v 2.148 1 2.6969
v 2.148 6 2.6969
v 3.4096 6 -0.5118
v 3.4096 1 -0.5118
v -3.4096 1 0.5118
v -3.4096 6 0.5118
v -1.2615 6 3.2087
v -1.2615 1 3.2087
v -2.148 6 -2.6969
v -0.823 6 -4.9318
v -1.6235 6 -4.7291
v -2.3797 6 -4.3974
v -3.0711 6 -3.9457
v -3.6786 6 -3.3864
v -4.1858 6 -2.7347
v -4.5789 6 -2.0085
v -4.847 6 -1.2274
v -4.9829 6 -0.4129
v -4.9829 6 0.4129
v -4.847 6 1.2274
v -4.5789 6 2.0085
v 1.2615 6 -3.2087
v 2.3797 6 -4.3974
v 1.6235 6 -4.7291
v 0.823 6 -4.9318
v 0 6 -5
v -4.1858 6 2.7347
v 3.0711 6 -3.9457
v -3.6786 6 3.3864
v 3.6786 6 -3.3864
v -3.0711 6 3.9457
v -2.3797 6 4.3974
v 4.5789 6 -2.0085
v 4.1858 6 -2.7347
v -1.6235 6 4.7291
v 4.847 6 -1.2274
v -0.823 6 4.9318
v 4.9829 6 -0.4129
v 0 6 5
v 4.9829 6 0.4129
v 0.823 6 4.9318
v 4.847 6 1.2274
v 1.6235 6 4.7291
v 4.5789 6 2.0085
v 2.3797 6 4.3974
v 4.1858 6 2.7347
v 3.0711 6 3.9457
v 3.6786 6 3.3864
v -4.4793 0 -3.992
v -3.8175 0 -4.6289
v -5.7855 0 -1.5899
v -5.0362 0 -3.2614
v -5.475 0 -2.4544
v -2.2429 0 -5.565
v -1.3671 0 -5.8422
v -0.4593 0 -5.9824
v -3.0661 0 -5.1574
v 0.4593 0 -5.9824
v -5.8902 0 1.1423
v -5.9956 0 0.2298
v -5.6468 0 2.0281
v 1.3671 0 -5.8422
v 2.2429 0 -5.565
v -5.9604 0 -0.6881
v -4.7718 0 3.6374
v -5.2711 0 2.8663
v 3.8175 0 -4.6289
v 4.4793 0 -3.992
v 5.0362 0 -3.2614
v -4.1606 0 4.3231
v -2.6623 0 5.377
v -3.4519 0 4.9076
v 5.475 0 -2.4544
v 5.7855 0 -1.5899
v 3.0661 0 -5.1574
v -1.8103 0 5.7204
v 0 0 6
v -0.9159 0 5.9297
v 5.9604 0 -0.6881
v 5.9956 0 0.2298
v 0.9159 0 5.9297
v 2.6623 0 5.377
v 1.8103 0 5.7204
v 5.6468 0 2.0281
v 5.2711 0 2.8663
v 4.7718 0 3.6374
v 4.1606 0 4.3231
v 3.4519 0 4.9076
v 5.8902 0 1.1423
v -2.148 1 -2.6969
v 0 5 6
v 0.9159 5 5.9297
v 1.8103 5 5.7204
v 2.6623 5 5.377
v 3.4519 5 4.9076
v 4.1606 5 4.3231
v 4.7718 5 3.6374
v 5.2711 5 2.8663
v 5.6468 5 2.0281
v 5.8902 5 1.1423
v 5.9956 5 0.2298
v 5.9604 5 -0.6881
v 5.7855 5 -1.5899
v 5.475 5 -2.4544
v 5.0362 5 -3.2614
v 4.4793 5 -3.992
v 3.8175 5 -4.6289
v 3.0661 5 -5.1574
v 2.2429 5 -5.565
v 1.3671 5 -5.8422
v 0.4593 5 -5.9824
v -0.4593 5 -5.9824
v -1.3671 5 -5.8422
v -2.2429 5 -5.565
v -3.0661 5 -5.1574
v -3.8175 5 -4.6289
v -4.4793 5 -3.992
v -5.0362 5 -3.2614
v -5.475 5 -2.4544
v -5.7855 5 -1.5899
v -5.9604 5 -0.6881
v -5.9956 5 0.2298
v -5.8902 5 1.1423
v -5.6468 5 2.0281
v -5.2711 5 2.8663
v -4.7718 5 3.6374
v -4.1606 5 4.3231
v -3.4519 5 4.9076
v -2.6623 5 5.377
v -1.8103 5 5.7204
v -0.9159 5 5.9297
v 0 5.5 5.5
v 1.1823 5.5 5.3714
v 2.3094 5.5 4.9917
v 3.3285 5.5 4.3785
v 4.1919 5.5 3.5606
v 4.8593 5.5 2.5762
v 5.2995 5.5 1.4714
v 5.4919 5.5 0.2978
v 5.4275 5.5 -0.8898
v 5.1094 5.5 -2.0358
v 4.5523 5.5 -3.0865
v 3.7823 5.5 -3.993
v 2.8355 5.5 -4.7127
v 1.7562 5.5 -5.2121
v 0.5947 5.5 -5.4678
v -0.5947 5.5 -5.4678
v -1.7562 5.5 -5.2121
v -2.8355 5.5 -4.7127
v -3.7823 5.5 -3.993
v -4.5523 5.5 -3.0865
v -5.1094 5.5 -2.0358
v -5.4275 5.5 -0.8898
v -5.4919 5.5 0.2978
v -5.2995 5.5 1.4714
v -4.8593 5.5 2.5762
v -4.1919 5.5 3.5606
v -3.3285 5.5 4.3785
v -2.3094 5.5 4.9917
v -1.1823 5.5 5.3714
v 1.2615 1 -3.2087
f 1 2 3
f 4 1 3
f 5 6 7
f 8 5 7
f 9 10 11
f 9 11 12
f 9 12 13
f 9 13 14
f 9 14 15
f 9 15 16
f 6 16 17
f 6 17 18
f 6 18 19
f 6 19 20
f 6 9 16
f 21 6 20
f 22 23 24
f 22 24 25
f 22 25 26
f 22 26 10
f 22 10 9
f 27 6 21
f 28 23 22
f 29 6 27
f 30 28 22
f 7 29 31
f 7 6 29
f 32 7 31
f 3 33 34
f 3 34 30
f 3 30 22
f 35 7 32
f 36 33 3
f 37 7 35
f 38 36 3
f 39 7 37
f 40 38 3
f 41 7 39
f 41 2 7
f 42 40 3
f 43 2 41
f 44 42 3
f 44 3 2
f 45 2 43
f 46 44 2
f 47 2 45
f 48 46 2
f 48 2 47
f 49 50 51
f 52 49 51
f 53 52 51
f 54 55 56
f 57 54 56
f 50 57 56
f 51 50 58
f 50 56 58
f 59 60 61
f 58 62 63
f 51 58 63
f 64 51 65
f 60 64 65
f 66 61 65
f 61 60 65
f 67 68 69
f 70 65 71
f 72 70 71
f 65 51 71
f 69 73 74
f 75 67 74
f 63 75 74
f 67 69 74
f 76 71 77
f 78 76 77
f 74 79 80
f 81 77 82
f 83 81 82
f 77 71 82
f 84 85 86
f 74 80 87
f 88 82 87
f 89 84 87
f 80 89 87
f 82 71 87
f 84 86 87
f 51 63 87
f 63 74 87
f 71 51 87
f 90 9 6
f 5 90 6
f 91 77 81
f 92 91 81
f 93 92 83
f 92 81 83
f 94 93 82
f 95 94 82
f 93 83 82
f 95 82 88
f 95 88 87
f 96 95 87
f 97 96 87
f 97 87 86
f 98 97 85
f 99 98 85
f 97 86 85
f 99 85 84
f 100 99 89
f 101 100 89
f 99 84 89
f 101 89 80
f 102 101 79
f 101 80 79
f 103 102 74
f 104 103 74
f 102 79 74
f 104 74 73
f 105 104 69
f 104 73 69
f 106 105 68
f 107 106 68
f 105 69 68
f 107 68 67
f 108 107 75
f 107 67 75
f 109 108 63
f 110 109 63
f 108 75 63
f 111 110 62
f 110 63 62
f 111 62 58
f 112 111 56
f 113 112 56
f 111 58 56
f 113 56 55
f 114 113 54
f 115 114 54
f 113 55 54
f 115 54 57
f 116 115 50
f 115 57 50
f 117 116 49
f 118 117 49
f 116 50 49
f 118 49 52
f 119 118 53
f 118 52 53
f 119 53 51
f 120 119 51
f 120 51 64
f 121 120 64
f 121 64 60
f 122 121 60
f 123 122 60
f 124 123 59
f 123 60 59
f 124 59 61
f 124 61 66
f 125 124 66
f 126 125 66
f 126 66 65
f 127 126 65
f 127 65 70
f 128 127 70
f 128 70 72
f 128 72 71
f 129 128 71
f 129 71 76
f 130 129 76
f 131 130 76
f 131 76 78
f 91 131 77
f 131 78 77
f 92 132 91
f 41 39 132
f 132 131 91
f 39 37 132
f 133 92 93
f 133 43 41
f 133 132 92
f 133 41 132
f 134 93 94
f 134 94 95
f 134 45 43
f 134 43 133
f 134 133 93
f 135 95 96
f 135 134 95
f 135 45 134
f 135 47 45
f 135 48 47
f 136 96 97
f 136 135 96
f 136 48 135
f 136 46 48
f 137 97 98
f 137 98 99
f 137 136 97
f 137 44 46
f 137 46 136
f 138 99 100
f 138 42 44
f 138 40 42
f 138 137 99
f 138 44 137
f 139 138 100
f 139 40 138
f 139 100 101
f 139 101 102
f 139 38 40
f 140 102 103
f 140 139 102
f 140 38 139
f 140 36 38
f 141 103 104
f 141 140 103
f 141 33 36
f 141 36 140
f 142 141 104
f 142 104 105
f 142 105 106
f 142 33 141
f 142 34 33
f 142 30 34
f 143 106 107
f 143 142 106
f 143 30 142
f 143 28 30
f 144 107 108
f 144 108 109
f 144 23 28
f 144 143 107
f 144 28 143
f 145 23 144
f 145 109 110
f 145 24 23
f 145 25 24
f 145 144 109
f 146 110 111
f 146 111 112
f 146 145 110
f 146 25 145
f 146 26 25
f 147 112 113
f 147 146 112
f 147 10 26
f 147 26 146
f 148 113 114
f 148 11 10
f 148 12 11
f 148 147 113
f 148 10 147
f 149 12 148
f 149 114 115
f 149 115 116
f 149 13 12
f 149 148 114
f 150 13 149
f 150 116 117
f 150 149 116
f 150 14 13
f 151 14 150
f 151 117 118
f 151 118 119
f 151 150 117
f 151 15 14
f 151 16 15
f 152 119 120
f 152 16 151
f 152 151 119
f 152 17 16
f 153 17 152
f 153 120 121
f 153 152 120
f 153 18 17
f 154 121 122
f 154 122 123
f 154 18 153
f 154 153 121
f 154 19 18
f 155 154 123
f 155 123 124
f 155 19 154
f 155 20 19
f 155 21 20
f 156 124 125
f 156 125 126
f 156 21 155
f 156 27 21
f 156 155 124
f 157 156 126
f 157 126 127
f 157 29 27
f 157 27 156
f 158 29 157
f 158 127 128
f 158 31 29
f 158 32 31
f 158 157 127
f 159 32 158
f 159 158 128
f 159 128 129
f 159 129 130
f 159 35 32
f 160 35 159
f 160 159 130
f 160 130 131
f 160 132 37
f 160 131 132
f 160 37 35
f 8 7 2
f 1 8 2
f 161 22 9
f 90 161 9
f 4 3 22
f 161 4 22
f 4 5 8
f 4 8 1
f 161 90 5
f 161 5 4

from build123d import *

# Parameters (mm, degrees)
SKETCH_1_R          = 6
EXTRUDE_1_DEPTH     = 6
CUT_EXTRUDE_1_DEPTH = 5
CHAMFER_1_SIZE      = 1


with BuildPart() as part:
    # 草图1 → 凸台-拉伸1 (new body)
    with BuildSketch(Plane(origin=(0, 0, 0), x_dir=(1, 0, 0), z_dir=(0, 1, 0))):
        with Locations(Location((0, 0, 0), (0, 0, 270))):
            Circle(SKETCH_1_R)
    extrude(amount=EXTRUDE_1_DEPTH)

    # 草图2 → 切除-拉伸1 (cut)
    with BuildSketch(Plane(origin=(0, 6, 0), x_dir=(1, 0, 0), z_dir=(0, 1, 0))):
        Polygon((1.261535508, 3.20868814), (-2.148037688, 2.696865868), (-3.409573196, -0.511822272), (-1.261535508, -3.20868814), (2.148037688, -2.696865868), (3.409573196, 0.511822272), align=None)
    extrude(amount=-CUT_EXTRUDE_1_DEPTH, mode=Mode.SUBTRACT)

    # 倒角1
    chamfer_1_edges = [part.edges().sort_by_distance(p)[0] for p in [
        (0, 6, -6),
    ]]
    chamfer(chamfer_1_edges, length=CHAMFER_1_SIZE)


solid = part.part
